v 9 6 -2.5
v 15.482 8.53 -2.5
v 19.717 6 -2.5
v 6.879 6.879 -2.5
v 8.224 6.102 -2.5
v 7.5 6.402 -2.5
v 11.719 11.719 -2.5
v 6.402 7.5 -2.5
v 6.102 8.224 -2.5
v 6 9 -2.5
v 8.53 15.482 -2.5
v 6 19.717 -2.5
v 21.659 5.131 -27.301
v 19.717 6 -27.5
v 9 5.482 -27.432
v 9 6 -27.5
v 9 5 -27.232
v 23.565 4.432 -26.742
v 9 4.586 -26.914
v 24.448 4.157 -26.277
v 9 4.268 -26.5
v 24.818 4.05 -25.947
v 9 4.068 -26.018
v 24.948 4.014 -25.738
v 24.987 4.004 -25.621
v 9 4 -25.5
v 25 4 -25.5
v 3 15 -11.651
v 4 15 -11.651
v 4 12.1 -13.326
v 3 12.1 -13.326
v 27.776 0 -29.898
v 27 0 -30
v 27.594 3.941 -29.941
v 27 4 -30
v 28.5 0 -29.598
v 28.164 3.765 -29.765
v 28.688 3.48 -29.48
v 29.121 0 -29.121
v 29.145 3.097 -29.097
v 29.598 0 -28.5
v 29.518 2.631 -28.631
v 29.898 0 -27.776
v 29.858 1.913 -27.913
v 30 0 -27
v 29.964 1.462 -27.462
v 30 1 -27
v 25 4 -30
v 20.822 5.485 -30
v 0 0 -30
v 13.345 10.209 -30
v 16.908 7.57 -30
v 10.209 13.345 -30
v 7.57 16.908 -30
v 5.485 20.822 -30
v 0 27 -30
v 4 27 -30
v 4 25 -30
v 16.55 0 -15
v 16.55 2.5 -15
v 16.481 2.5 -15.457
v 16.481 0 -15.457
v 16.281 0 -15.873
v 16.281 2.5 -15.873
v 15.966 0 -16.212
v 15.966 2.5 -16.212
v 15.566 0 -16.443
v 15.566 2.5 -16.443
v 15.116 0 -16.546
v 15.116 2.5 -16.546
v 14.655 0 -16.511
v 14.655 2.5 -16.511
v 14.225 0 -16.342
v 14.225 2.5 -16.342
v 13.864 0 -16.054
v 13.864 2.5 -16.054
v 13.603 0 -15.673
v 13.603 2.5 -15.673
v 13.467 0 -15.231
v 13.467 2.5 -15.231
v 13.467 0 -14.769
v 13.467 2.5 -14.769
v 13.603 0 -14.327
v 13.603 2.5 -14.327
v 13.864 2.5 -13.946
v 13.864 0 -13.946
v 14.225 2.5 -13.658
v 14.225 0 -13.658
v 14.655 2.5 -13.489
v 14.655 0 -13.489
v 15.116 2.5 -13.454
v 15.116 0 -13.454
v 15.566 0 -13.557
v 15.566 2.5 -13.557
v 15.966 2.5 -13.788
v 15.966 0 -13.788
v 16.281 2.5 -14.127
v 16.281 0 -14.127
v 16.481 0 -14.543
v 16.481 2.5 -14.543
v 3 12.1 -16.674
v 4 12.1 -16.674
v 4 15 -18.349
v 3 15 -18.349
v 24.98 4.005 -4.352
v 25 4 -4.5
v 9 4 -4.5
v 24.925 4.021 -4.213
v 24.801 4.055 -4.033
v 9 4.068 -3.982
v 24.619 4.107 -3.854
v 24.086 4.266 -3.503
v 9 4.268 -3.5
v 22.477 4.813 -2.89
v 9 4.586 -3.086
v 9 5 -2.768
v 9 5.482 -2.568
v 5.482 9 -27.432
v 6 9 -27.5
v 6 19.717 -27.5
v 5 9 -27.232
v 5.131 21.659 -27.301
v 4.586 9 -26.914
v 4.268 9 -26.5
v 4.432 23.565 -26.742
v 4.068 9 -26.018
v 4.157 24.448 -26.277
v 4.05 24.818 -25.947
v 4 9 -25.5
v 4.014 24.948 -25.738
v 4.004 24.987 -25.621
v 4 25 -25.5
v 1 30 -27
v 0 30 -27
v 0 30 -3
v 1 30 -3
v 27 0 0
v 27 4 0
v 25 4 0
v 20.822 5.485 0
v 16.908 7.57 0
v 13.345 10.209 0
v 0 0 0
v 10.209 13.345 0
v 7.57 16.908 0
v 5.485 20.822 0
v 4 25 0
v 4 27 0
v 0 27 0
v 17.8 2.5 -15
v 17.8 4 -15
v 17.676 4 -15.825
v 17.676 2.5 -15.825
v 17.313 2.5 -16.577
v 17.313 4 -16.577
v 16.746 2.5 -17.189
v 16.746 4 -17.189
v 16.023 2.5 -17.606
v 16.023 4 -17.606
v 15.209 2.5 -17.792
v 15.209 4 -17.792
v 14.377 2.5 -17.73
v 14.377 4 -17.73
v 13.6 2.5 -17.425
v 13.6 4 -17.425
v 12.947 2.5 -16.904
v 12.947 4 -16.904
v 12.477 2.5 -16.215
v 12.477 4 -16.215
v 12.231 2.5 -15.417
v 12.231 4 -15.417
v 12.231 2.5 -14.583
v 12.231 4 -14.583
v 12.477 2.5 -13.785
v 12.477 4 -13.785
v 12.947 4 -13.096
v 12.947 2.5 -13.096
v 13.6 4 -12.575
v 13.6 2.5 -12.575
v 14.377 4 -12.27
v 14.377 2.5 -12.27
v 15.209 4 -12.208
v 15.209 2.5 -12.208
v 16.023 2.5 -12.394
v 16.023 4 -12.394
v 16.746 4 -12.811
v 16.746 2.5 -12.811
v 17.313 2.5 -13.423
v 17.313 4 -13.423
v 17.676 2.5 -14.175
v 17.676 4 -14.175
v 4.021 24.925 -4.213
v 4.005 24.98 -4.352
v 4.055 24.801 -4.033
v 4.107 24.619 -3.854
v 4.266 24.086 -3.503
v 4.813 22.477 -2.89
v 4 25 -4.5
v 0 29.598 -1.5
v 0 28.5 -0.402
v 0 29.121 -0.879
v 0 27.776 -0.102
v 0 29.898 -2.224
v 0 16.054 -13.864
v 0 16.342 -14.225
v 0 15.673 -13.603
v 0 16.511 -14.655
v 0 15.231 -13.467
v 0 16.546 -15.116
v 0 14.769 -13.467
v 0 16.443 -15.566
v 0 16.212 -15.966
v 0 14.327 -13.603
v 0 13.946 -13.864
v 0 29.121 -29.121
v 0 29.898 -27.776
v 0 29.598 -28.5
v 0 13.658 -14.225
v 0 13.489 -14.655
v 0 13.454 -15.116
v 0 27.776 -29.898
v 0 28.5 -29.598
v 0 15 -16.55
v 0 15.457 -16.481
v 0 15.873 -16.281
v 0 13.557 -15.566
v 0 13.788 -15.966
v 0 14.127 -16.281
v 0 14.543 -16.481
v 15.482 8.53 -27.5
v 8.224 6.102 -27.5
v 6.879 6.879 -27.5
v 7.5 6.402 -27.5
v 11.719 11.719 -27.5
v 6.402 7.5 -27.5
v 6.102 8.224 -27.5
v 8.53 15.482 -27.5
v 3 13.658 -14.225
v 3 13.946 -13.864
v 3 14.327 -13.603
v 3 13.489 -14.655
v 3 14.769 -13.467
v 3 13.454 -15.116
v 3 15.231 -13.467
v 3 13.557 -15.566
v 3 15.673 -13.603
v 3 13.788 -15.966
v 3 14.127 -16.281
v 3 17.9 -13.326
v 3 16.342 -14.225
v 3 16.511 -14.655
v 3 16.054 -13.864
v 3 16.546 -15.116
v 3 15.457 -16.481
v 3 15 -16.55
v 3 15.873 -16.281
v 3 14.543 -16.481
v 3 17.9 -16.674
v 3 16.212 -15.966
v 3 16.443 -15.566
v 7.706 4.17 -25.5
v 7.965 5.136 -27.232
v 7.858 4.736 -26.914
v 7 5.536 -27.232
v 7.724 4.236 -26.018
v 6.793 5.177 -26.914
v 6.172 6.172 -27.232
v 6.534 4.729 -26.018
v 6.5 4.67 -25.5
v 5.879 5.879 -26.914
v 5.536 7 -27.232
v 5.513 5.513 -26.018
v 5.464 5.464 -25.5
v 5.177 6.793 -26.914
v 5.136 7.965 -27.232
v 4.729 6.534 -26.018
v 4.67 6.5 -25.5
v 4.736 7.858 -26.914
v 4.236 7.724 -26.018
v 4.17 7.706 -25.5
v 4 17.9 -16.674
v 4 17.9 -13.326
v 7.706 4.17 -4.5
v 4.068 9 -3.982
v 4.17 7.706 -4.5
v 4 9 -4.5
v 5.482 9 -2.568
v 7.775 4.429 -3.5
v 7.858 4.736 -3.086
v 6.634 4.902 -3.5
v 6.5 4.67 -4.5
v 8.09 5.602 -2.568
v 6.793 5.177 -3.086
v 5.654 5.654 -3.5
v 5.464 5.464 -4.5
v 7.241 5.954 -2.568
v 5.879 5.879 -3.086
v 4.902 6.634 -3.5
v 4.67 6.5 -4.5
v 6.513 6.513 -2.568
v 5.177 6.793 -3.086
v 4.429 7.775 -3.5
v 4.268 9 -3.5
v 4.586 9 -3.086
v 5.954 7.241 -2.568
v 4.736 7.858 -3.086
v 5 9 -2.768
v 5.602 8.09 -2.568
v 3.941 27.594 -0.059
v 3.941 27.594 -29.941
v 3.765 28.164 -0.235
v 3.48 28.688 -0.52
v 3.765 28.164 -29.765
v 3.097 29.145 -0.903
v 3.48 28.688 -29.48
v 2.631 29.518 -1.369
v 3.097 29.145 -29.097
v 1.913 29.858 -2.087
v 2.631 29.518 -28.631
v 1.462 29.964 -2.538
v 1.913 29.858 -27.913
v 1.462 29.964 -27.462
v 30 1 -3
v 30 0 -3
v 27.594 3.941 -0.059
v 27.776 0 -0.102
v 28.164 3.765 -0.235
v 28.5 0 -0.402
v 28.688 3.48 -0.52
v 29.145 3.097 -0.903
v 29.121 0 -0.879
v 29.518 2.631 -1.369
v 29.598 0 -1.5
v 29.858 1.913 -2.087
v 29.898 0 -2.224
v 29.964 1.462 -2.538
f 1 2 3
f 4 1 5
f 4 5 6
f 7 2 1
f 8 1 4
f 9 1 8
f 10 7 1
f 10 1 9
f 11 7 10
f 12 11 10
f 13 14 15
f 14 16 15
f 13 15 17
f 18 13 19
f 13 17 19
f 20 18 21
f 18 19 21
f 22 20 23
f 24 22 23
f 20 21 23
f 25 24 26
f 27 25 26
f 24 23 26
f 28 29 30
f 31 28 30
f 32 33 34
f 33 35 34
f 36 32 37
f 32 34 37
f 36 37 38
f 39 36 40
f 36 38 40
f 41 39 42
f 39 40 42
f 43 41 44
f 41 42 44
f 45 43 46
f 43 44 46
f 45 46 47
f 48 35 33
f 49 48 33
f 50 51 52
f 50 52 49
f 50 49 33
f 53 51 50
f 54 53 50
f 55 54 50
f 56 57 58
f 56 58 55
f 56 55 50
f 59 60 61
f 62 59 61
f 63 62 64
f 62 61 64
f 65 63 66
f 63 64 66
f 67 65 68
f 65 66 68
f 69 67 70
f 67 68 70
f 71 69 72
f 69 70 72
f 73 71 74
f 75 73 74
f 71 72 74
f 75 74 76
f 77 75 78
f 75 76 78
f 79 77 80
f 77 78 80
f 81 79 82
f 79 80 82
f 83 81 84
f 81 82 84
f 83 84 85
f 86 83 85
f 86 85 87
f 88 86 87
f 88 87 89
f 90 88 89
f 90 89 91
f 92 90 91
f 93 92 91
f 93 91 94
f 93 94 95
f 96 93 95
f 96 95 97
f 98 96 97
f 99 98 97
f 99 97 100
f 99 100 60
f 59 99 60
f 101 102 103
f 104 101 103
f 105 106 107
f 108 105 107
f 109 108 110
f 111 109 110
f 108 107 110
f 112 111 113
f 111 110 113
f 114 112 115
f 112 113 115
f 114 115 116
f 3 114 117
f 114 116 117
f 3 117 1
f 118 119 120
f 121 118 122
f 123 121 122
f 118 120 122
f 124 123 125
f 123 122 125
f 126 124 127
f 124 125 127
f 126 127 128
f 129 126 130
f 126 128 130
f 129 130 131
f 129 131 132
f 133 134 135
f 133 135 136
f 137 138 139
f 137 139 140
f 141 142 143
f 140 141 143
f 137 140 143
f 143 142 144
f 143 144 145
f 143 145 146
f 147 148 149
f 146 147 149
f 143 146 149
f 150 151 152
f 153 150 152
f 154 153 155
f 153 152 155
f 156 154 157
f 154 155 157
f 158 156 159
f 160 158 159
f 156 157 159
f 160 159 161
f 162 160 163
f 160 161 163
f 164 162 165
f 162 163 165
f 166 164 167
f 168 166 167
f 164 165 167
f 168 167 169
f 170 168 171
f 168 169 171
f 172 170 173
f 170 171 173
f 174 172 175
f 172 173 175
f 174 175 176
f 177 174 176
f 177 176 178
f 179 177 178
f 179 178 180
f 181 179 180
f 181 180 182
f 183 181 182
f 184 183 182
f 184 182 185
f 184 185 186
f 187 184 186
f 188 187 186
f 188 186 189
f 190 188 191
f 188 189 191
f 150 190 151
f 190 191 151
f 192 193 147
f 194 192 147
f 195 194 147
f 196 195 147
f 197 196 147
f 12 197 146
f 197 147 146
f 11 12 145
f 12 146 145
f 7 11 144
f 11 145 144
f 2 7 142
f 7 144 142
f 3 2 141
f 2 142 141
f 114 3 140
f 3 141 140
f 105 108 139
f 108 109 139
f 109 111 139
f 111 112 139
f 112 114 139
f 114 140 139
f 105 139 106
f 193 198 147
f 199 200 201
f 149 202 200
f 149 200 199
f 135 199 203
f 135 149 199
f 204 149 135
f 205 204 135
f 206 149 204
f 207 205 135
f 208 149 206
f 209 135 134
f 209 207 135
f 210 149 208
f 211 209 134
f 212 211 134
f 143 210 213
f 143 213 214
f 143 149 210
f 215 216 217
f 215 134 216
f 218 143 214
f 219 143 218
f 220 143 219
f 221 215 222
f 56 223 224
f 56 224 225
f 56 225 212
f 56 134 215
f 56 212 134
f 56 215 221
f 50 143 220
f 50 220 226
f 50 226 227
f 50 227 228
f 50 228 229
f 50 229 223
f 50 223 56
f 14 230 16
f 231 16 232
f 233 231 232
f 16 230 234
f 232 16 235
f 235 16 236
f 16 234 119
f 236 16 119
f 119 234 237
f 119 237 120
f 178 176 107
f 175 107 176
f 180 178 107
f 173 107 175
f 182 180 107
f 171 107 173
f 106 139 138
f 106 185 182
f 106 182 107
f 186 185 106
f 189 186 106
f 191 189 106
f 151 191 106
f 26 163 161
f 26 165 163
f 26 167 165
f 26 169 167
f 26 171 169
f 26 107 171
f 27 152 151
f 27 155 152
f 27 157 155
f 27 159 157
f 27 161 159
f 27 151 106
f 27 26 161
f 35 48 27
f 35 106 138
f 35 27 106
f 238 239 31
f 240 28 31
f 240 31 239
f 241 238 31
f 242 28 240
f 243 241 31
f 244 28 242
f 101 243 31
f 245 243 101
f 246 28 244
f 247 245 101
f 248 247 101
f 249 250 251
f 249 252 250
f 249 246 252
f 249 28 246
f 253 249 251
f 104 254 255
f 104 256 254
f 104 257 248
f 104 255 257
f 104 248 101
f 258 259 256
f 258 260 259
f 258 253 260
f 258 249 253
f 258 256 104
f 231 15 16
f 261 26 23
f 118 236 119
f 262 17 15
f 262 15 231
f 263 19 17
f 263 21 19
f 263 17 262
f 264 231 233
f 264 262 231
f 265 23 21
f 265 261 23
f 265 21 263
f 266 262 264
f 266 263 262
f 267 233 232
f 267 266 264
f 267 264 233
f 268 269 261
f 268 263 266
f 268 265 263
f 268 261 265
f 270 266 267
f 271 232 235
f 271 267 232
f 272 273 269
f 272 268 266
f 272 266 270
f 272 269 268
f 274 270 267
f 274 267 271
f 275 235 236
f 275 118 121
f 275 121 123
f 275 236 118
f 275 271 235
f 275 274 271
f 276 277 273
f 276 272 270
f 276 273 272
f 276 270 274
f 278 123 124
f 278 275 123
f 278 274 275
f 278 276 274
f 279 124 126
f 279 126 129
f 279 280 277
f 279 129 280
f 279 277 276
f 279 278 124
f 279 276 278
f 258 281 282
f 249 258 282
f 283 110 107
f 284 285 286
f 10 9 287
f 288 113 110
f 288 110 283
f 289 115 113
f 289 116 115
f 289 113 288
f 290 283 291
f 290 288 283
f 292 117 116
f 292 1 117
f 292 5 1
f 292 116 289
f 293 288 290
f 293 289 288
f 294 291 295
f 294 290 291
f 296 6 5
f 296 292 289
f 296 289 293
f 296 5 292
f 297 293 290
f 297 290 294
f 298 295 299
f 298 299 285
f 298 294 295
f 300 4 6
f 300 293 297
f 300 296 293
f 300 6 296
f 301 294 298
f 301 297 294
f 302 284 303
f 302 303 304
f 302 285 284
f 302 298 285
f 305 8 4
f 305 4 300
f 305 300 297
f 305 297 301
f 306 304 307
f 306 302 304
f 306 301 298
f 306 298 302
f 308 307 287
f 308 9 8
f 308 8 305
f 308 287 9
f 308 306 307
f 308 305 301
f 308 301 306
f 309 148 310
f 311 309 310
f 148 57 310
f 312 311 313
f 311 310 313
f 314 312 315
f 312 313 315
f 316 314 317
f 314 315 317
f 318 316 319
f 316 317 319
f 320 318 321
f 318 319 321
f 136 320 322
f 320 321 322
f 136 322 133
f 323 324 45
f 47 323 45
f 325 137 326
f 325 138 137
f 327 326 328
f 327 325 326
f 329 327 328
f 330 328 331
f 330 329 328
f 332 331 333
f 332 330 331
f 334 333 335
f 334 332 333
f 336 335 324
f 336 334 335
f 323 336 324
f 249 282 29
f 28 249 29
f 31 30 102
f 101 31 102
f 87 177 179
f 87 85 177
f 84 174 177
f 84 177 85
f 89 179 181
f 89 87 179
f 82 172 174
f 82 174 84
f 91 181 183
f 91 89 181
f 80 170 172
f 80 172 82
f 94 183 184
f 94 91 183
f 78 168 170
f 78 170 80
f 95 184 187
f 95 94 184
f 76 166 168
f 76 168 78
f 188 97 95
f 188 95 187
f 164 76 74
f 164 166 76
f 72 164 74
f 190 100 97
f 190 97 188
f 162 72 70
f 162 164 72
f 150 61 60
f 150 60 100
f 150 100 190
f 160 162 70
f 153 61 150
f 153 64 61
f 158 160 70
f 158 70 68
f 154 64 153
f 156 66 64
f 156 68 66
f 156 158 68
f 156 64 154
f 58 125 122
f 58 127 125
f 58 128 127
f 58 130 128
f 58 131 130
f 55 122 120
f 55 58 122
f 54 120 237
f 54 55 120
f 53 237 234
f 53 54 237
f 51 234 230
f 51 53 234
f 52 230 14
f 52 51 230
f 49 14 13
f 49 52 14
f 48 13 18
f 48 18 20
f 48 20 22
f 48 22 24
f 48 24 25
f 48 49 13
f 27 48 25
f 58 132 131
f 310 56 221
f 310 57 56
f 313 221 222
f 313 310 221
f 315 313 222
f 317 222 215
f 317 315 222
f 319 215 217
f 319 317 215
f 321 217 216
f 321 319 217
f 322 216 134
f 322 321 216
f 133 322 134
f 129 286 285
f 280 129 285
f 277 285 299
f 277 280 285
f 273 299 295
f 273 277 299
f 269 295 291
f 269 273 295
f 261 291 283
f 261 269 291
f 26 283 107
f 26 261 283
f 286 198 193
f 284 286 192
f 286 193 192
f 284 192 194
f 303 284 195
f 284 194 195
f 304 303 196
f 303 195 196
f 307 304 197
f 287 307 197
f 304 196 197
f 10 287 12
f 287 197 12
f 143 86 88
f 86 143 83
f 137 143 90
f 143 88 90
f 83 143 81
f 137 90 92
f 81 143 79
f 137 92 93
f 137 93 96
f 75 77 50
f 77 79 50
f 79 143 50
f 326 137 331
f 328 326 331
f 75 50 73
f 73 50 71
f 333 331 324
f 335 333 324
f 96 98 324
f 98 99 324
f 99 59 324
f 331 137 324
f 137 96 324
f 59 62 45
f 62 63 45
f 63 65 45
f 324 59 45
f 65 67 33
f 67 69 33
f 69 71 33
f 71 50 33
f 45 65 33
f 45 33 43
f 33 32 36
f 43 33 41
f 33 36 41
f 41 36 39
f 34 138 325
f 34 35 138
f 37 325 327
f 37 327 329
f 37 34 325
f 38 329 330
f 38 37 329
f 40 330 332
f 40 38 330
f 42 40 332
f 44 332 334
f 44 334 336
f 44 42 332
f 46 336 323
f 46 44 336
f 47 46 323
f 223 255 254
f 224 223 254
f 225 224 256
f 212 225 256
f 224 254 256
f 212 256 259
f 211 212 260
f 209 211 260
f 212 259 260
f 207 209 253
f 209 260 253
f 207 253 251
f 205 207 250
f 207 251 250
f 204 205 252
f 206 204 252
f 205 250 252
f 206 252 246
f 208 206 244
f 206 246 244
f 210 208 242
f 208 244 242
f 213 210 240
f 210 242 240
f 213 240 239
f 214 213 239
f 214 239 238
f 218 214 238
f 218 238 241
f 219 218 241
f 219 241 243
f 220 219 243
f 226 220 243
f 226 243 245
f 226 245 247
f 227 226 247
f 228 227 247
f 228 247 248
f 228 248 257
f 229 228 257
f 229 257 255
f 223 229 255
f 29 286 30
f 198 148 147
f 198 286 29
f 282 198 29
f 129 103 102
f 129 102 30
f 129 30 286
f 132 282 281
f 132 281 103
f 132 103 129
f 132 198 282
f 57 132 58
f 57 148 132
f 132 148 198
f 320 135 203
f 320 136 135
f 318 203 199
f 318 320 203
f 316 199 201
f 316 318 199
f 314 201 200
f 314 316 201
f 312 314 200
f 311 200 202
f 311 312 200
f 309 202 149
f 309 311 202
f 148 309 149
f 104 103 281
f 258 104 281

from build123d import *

# Parameters (mm, degrees)
CROQUIS1_W              = 30
CROQUIS1_H              = 30
SALIENTE_EXTRUIR1_DEPTH = 30
CROQUIS2_W              = 26
CROQUIS2_H              = 30
CORTAR_EXTRUIR1_DEPTH   = 26
CROQUIS3_R              = 1.55
CORTAR_EXTRUIR2_DEPTH   = 4
CROQUIS4_R              = 1.55
CORTAR_EXTRUIR3_DEPTH   = 4
CORTAR_EXTRUIR5_DEPTH   = 1
SALIENTE_EXTRUIR2_DEPTH = 2.5
SALIENTE_EXTRUIR3_DEPTH = 2.5
CROQUIS9_R              = 2.8
CORTAR_EXTRUIR6_DEPTH   = 1.5
REDONDEO1_R             = 5
REDONDEO2_R             = 3
REDONDEO3_R             = 2


with BuildPart() as part:
    # Croquis1 → Saliente-Extruir1 (new body)
    with BuildSketch(Plane(origin=(0, 0, 0), x_dir=(1, 0, 0), z_dir=(0, 1, 0))):
        with Locations((15, 15)):
            Rectangle(CROQUIS1_W, CROQUIS1_H)
    extrude(amount=SALIENTE_EXTRUIR1_DEPTH)

    # Croquis2 → Cortar-Extruir1 (cut)
    with BuildSketch(Plane(origin=(0, 30, 0), x_dir=(1, 0, 0), z_dir=(0, 1, 0))):
        with Locations((17, 15)):
            Rectangle(CROQUIS2_W, CROQUIS2_H)
    extrude(amount=-CORTAR_EXTRUIR1_DEPTH, mode=Mode.SUBTRACT)

    # Croquis3 → Cortar-Extruir2 (cut)
    with BuildSketch(Plane(origin=(4, 0, 0), x_dir=(0, 0, -1), z_dir=(1, 0, 0))):
        with Locations((15, 15)):
            Circle(CROQUIS3_R)
    extrude(amount=-CORTAR_EXTRUIR2_DEPTH, mode=Mode.SUBTRACT)

    # Croquis4 → Cortar-Extruir3 (cut)
    with BuildSketch(Plane(origin=(0, 4, 0), x_dir=(1, 0, 0), z_dir=(0, 1, 0))):
        with Locations((15, 15)):
            Circle(CROQUIS4_R)
    extrude(amount=-CORTAR_EXTRUIR3_DEPTH, mode=Mode.SUBTRACT)

    # Croquis6 → Cortar-Extruir5 (cut)
    with BuildSketch(Plane(origin=(4, 0, 0), x_dir=(0, 0, -1), z_dir=(1, 0, 0))):
        Polygon((11.651368439, 15), (13.325684219, 12.1), (16.674315781, 12.1), (18.348631561, 15), (16.674315781, 17.9), (13.325684219, 17.9), align=None)
    extrude(amount=-CORTAR_EXTRUIR5_DEPTH, mode=Mode.SUBTRACT)

    # Croquis7 → Saliente-Extruir2 (add)
    with BuildSketch(Plane.XY):
        with BuildLine():
            Line((25, 4), (4, 4))
            Line((4, 4), (4, 25))
            ThreePointArc((4, 25), (11.719105156, 11.719105156), (25, 4))
        make_face()
    extrude(amount=-SALIENTE_EXTRUIR2_DEPTH)

    # Croquis8 → Saliente-Extruir3 (add)
    with BuildSketch(Plane(origin=(0, 0, -30), x_dir=(-1, 0, 0), z_dir=(0, 0, -1))):
        with BuildLine():
            Line((-25, 4), (-4, 4))
            Line((-4, 4), (-4, 25))
            ThreePointArc((-4, 25), (-11.719105156, 11.719105156), (-25, 4))
        make_face()
    extrude(amount=-SALIENTE_EXTRUIR3_DEPTH)

    # Croquis9 → Cortar-Extruir6 (cut)
    with BuildSketch(Plane(origin=(0, 4, 0), x_dir=(1, 0, 0), z_dir=(0, 1, 0))):
        with Locations((15, 15)):
            Circle(CROQUIS9_R)
    extrude(amount=-CORTAR_EXTRUIR6_DEPTH, mode=Mode.SUBTRACT)

    # Redondeo1
    redondeo1_edges = [part.edges().sort_by_distance(p)[0] for p in [
        (4, 4, -15),
    ]]
    fillet(redondeo1_edges, radius=REDONDEO1_R)

    # Redondeo2
    redondeo2_edges = [part.edges().sort_by_distance(p)[0] for p in [
        (2, 30, -30),
        (30, 2, -30),
        (30, 2, 0),
        (30, 4, -15),
        (4, 30, -15),
        (2, 30, 0),
    ]]
    fillet(redondeo2_edges, radius=REDONDEO2_R)

    # Redondeo3
    redondeo3_edges = [part.edges().sort_by_distance(p)[0] for p in [
        (4, 17, -2.5),
        (17, 4, -27.5),
        (17, 4, -2.5),
        (5.464466094, 5.464466094, -2.5),
        (4, 17, -27.5),
        (5.464466094, 5.464466094, -27.5),
    ]]
    fillet(redondeo3_edges, radius=REDONDEO3_R)


solid = part.part
